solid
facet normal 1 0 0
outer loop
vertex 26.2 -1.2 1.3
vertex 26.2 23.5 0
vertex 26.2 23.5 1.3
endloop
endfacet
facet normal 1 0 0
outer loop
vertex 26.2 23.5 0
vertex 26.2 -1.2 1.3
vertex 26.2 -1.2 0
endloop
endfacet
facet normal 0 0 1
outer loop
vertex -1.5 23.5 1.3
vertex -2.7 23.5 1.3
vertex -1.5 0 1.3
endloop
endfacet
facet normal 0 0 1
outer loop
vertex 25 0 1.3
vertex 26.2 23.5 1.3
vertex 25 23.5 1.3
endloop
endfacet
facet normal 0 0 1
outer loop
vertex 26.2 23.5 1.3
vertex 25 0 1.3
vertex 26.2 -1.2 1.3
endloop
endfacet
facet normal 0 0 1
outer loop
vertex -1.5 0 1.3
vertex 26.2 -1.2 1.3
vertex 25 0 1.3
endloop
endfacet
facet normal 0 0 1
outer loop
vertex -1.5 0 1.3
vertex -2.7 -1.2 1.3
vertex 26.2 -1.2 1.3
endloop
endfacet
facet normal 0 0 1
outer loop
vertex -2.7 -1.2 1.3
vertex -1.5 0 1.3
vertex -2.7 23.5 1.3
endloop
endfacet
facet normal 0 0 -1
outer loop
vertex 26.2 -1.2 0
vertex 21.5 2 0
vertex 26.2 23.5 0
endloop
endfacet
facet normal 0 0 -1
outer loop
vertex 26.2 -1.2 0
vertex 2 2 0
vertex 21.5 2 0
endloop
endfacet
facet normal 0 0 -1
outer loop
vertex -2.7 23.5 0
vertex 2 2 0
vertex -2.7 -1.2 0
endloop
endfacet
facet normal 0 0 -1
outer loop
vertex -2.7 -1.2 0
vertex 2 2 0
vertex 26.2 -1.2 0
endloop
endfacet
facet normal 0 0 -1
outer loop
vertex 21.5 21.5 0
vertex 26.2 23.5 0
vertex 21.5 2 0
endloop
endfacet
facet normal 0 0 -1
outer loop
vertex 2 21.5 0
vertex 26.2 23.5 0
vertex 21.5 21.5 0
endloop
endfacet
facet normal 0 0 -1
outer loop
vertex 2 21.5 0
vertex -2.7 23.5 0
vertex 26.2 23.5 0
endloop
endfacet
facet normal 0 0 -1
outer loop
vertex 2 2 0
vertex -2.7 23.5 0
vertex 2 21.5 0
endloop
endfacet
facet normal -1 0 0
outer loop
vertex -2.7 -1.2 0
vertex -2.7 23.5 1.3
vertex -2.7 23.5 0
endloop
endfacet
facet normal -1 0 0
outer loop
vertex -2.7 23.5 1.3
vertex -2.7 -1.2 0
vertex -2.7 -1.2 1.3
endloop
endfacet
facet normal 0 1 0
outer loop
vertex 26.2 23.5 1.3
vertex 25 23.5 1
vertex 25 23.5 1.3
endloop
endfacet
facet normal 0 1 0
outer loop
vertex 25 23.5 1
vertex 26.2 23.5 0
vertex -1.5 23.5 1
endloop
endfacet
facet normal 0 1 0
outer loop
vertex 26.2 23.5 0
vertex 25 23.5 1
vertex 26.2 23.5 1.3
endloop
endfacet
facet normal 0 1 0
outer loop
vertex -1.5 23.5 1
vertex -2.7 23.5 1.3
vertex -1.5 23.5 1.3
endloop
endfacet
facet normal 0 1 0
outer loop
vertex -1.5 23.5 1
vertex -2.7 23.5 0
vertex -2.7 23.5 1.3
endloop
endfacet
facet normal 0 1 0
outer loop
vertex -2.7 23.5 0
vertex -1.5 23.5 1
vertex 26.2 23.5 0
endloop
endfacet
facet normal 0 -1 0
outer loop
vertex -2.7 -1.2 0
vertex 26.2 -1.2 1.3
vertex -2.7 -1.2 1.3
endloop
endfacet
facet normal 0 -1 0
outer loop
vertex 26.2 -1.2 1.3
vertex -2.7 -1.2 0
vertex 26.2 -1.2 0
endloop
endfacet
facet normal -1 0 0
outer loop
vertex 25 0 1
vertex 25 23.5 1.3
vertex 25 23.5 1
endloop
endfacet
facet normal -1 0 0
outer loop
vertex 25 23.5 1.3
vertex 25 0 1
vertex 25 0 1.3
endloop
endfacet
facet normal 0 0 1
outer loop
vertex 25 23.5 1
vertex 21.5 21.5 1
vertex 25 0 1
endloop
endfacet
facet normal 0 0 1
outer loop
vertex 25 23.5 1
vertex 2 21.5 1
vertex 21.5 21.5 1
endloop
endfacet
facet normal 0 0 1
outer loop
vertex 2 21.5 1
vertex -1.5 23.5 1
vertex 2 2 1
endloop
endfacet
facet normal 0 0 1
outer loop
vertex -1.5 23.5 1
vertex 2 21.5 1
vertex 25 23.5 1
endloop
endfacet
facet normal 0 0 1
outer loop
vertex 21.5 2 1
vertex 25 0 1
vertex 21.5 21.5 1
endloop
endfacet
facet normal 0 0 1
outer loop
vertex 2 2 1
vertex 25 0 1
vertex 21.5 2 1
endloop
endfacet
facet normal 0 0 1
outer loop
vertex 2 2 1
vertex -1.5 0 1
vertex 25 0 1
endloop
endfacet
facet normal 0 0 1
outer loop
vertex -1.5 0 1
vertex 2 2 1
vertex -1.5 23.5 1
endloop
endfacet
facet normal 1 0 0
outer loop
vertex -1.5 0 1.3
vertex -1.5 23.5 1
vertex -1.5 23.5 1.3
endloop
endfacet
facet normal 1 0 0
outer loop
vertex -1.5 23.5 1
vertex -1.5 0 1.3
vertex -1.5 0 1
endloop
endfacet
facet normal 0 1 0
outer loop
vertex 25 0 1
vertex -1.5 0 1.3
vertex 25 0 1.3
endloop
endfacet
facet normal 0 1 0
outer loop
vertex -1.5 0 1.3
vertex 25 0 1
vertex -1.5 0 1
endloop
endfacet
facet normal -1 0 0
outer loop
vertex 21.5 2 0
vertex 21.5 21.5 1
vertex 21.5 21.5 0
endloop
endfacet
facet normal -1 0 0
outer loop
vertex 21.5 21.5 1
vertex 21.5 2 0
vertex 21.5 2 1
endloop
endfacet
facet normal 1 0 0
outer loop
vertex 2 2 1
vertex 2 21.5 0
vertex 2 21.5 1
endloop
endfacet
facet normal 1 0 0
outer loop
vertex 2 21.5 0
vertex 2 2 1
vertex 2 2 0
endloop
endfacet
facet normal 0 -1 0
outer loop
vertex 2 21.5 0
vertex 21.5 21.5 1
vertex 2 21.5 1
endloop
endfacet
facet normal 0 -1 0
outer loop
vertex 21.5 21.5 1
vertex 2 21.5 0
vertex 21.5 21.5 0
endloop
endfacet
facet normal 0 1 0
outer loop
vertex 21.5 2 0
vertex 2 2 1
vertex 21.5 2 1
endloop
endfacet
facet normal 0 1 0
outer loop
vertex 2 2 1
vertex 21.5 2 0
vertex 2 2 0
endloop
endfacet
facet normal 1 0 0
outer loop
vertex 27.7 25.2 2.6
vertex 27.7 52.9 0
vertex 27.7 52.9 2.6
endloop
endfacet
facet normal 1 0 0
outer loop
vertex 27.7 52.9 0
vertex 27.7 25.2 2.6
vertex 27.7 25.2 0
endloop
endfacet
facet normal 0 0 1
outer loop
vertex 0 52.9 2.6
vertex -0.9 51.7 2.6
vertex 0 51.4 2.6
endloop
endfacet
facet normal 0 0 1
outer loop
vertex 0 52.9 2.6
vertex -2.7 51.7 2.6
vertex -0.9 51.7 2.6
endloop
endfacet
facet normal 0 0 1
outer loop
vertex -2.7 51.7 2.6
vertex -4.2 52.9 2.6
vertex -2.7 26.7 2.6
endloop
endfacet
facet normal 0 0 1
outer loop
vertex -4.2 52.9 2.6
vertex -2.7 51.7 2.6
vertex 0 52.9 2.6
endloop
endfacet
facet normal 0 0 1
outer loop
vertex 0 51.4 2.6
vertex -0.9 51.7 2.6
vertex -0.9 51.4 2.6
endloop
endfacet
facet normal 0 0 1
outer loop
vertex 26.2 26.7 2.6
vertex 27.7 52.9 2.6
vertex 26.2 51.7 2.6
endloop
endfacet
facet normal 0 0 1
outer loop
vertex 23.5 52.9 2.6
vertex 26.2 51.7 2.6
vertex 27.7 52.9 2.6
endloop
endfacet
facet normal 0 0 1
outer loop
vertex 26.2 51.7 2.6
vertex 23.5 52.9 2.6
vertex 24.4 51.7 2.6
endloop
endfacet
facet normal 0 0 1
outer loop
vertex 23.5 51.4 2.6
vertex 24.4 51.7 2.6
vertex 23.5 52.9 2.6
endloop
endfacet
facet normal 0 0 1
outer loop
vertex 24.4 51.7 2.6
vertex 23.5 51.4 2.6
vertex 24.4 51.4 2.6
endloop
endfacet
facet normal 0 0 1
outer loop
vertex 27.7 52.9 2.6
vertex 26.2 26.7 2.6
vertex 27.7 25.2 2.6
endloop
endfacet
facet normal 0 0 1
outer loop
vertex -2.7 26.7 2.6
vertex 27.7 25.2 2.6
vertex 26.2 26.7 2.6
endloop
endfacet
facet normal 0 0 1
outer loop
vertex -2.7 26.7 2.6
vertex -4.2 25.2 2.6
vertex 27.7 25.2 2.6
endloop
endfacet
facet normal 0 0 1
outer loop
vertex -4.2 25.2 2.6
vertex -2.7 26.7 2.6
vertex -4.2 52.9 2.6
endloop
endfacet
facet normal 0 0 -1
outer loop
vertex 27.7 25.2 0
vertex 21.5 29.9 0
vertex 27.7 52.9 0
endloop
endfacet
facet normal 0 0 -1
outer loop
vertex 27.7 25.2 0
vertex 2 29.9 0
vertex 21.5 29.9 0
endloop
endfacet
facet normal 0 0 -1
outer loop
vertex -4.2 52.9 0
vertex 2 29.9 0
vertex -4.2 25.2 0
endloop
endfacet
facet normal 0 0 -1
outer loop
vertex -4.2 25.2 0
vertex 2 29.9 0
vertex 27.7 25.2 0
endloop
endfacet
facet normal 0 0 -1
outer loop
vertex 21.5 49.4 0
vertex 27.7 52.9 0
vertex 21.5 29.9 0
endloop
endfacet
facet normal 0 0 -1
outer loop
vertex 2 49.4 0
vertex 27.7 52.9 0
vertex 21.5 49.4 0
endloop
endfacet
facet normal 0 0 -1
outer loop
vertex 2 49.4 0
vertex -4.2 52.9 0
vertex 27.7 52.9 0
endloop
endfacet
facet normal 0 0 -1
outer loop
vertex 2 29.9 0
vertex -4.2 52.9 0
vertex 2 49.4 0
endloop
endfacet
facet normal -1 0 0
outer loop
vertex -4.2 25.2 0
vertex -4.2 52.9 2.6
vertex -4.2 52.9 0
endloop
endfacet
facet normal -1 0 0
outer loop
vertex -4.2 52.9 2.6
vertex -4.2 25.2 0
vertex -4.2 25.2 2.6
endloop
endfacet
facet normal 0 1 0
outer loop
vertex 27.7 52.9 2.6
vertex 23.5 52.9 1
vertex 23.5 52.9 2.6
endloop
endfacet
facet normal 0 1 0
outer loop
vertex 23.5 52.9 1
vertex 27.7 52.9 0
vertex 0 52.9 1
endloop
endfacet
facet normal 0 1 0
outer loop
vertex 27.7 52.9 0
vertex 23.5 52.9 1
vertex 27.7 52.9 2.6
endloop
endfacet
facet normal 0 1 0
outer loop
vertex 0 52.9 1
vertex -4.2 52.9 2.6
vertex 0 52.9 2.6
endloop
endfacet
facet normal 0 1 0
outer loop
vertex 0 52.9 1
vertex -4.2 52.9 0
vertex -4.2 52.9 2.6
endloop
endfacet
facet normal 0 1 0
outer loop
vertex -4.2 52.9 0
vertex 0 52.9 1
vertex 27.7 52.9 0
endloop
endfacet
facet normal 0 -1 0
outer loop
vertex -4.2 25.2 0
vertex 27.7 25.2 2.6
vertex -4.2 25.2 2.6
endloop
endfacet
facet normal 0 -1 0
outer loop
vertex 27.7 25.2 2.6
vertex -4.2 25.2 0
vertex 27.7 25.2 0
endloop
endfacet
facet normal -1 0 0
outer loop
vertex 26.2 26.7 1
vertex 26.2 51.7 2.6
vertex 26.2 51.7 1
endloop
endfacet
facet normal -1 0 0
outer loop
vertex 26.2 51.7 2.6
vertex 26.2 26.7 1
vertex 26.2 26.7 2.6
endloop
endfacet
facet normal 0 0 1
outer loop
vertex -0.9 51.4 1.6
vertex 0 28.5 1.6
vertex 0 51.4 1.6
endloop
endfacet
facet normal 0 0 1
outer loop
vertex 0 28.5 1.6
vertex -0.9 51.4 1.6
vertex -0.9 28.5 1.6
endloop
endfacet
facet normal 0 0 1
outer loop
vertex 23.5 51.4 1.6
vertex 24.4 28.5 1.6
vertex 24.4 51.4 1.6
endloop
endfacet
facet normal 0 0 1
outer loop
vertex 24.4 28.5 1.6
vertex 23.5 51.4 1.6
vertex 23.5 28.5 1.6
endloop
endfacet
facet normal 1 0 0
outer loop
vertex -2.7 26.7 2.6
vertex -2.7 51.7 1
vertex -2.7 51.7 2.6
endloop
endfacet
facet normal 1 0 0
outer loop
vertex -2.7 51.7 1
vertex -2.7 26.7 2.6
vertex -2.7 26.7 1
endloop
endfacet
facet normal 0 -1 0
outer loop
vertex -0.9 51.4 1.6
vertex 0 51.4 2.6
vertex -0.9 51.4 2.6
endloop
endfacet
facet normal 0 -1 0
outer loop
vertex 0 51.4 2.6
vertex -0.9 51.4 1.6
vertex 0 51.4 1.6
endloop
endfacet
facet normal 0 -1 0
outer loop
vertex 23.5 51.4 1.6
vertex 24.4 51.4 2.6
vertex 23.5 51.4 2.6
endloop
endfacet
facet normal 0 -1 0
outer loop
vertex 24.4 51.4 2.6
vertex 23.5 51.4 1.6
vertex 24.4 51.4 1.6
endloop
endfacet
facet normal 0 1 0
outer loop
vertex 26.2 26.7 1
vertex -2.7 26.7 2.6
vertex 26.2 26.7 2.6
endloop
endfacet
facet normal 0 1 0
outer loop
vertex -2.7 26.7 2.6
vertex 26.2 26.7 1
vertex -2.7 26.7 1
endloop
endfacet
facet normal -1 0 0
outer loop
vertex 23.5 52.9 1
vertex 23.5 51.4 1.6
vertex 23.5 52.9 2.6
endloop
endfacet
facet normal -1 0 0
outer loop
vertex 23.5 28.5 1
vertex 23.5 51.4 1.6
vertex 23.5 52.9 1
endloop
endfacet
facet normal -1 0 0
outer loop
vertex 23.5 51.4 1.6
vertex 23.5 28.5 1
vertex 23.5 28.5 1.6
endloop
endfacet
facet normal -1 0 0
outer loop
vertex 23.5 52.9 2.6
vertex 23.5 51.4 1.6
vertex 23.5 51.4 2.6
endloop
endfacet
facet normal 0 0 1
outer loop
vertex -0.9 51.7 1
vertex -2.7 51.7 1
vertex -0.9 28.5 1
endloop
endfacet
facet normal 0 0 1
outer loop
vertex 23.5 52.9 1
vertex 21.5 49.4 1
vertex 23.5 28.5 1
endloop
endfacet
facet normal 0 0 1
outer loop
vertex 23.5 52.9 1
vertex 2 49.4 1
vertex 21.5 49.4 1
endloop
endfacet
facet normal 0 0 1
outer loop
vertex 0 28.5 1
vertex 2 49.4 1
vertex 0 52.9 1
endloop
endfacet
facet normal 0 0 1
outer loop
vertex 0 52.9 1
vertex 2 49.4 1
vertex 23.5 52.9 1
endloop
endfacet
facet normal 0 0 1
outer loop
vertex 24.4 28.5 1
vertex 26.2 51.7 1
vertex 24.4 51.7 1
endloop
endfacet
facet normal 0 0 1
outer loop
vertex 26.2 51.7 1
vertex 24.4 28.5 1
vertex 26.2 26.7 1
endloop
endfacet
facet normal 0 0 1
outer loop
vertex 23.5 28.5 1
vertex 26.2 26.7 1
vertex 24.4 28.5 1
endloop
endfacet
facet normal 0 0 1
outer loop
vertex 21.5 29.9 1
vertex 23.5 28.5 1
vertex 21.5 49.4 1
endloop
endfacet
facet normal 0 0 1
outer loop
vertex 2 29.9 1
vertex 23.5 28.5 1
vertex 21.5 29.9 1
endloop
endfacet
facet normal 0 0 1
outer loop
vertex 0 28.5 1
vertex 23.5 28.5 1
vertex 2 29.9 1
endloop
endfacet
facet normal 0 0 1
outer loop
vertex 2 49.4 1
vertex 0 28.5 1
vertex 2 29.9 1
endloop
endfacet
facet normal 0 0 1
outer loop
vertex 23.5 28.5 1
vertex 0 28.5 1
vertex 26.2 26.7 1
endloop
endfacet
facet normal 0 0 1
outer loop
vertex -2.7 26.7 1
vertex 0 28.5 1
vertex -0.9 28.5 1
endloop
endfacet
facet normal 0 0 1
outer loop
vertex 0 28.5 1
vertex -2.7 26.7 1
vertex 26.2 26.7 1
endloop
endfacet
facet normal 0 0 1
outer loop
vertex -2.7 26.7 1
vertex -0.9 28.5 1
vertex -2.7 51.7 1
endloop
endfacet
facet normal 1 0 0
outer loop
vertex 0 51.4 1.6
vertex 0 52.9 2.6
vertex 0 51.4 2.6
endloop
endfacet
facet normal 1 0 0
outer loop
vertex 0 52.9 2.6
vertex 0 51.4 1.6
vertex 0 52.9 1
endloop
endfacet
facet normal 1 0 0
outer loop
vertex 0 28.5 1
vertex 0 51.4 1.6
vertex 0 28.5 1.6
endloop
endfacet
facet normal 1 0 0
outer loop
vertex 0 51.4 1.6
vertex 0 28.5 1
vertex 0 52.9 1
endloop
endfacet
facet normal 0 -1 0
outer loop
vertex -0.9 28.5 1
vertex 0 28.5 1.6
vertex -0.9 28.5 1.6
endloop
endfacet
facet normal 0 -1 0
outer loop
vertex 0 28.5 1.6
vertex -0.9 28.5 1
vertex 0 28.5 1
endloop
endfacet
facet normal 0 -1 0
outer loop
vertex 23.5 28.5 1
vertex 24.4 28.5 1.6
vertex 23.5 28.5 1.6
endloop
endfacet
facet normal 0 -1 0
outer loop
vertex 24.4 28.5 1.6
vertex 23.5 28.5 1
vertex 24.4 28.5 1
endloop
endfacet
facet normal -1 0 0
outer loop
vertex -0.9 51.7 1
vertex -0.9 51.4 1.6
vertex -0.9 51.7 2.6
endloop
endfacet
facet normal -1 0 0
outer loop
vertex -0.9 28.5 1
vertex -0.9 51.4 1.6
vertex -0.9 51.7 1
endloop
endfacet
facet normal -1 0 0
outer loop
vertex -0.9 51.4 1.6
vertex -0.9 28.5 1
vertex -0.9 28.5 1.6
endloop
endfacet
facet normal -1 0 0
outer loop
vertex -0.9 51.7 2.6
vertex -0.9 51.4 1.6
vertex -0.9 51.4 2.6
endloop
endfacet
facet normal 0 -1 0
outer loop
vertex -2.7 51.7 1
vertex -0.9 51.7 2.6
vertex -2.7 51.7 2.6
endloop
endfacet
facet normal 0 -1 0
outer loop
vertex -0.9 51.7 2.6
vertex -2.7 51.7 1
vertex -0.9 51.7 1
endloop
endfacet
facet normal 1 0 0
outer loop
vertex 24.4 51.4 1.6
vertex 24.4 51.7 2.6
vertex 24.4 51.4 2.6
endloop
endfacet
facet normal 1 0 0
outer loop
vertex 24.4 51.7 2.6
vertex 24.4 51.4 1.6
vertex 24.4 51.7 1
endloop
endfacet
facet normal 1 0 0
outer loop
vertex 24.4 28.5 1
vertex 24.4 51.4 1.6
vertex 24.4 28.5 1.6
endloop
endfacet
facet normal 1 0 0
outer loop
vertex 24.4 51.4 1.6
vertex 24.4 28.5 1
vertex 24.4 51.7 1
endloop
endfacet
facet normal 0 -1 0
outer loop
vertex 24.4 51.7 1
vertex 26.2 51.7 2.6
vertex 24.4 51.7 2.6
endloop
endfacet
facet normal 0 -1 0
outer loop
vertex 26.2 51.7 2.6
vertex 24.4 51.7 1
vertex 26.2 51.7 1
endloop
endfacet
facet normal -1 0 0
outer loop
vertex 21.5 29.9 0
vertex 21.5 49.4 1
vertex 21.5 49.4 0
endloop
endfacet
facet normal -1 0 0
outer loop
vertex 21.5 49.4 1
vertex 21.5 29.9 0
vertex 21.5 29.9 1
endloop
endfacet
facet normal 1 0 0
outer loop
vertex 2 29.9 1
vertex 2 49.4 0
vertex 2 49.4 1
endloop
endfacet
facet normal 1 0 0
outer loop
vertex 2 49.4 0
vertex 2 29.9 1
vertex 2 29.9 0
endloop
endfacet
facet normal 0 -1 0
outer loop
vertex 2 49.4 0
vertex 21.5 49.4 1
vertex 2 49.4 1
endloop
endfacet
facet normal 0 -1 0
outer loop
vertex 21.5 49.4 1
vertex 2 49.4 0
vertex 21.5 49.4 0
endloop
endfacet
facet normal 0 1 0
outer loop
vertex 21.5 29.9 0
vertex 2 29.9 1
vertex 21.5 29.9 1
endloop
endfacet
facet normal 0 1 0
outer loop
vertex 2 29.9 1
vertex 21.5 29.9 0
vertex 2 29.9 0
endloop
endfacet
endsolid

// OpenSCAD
//design and code by bioprint (http://www.thingiverse.com/bioprint)
//This code generates a holder for coverslip holder at SBC (customizable)
// 2015-02-02:	first design



// Size of nozzle
SizeOfNozzle = 0.4; // size of nozzle
// Bottom thickness
BottomThickness = 1; // 1 mm
// Wall thickness measured in layers
WallThicknessInLayers = 3; // number of layers (originally 2)
// Inner Skirt Width
InnerSkirtWidth = 2; // 2 mm

// Chamber Height
ChamberHeight = 0.6; // 0.6 mm (2 layers); Slicer: Z-layer: 0.3mm (first layer 0.4mm)
// ChamberWidth
ChamberWidth = 23.5; // 23 mm
// ChamberLength
ChamberLength = 23.5; // 23 mm


// Lid Tolerance
LidTolerance = 0.3; // 0.2 mm


// Round Holder Diameter
RoundHolderDiameter = 7; // 6 mm

// Round Holder Length
RoundHolderLength = 4; // 8 mm


// Washer Diameter
WasherDiameter = 13; // 1/2" 
// Washer Thickness
WasherThickness = 0.75; // 1.5 mm

// Holder Opening
HolderOpening = 10; // 9 mm

// Holder Wall Thickness In Layers
HolderWallThicknessInLayers = 4; // 3 

// HolderHeight
HolderHeight = WasherDiameter/2; // 


// BuildWidth
BuildWidth = 140; // 140 mm
// BuildLength
BuildLength = 140; // 140 mm
// Enable Multiple Device Printing
EnableMultipleDevicePrinting = 1;




WallThicknessInMM = WallThicknessInLayers*SizeOfNozzle;


LidXOffset = 0;
LidYOffset = ChamberLength + 2*WallThicknessInMM + InnerSkirtWidth; 

TopXOffset = 0;
TopYOffset = ChamberLength + 2*WallThicknessInMM + InnerSkirtWidth; 

// Holder Yoffset
HolderYOffset = ChamberLength/2;
HolderWallThicknessInLayersInMM = HolderWallThicknessInLayers * SizeOfNozzle;
HolderInsideColumn = WasherDiameter/2-2*LidTolerance;


// for multiplexing
XOffset = 0;
YOffset = 0;



MaxX = 0;
MaxY = 0;




		// bottom layer
		difference(){
			translate([XOffset-2*WallThicknessInMM - LidTolerance,-1*WallThicknessInMM,0]) 
				cube(size = [ChamberWidth + WallThicknessInMM * 4 + 2*LidTolerance,
								ChamberLength + WallThicknessInMM,
								BottomThickness + ChamberHeight-LidTolerance], center = false); // snaps better
			translate([XOffset-1*WallThicknessInMM - LidTolerance,0,BottomThickness]) 
				cube(size = [ChamberWidth + 2*WallThicknessInMM + 2*LidTolerance,
								ChamberLength+WallThicknessInMM * 2,
								ChamberHeight], center = false);
		
			translate([XOffset+InnerSkirtWidth,InnerSkirtWidth,0]) 
				cube(size = [ChamberWidth-2*InnerSkirtWidth,
								ChamberLength-2*InnerSkirtWidth,
								BottomThickness], center = false);
		
		}
		
		
		
		
		// top layer
		difference(){
			translate([XOffset-3*WallThicknessInMM-2*LidTolerance,
						  TopYOffset-2*WallThicknessInMM-LidTolerance,0]) 
				cube(size = [ChamberWidth + WallThicknessInMM * 6 + LidTolerance * 4,
								ChamberLength + WallThicknessInMM * 3 + LidTolerance * 2,
								BottomThickness + ChamberHeight + BottomThickness], center = false);
		
			translate([XOffset-2*WallThicknessInMM - LidTolerance,TopYOffset - WallThicknessInMM,BottomThickness+ChamberHeight]) 
				cube(size = [ChamberWidth+4*WallThicknessInMM+2*LidTolerance,
								ChamberLength+WallThicknessInMM,
								BottomThickness], center = false);
		
			translate([XOffset,TopYOffset - WallThicknessInMM,BottomThickness]) 
				cube(size = [ChamberWidth,
								ChamberLength+4*WallThicknessInMM,
								ChamberHeight+2*BottomThickness], center = false);
		
			translate([XOffset,TopYOffset - WallThicknessInMM,BottomThickness]) 
				cube(size = [ChamberWidth,
								ChamberLength+4*WallThicknessInMM,
								ChamberHeight+2*BottomThickness], center = false);
		
			translate([XOffset-2*WallThicknessInMM - LidTolerance,TopYOffset - WallThicknessInMM,BottomThickness]) 
				cube(size = [ChamberWidth+4*WallThicknessInMM+2*LidTolerance,
								WallThicknessInMM+2*LidTolerance,
								ChamberHeight+2*BottomThickness], center = false);
		
		
			translate([XOffset-2*WallThicknessInMM - LidTolerance,TopYOffset - WallThicknessInMM,BottomThickness]) 
				cube(size = [WallThicknessInMM+2*LidTolerance,			
								ChamberLength+WallThicknessInMM+LidTolerance,
								ChamberHeight+2*BottomThickness], center = false);
		
			translate([XOffset+ChamberWidth + WallThicknessInMM - LidTolerance,TopYOffset - WallThicknessInMM,BottomThickness]) 
				cube(size = [WallThicknessInMM+2*LidTolerance,			
								ChamberLength+WallThicknessInMM+LidTolerance,
								ChamberHeight+2*BottomThickness], center = false);
		
		// top opening
			translate([XOffset+InnerSkirtWidth,InnerSkirtWidth + TopYOffset,0]) 
				cube(size = [ChamberWidth-2*InnerSkirtWidth,
								ChamberLength-2*InnerSkirtWidth,
								ChamberHeight+2*BottomThickness], center = false);
		
		
		
		
		}
		
